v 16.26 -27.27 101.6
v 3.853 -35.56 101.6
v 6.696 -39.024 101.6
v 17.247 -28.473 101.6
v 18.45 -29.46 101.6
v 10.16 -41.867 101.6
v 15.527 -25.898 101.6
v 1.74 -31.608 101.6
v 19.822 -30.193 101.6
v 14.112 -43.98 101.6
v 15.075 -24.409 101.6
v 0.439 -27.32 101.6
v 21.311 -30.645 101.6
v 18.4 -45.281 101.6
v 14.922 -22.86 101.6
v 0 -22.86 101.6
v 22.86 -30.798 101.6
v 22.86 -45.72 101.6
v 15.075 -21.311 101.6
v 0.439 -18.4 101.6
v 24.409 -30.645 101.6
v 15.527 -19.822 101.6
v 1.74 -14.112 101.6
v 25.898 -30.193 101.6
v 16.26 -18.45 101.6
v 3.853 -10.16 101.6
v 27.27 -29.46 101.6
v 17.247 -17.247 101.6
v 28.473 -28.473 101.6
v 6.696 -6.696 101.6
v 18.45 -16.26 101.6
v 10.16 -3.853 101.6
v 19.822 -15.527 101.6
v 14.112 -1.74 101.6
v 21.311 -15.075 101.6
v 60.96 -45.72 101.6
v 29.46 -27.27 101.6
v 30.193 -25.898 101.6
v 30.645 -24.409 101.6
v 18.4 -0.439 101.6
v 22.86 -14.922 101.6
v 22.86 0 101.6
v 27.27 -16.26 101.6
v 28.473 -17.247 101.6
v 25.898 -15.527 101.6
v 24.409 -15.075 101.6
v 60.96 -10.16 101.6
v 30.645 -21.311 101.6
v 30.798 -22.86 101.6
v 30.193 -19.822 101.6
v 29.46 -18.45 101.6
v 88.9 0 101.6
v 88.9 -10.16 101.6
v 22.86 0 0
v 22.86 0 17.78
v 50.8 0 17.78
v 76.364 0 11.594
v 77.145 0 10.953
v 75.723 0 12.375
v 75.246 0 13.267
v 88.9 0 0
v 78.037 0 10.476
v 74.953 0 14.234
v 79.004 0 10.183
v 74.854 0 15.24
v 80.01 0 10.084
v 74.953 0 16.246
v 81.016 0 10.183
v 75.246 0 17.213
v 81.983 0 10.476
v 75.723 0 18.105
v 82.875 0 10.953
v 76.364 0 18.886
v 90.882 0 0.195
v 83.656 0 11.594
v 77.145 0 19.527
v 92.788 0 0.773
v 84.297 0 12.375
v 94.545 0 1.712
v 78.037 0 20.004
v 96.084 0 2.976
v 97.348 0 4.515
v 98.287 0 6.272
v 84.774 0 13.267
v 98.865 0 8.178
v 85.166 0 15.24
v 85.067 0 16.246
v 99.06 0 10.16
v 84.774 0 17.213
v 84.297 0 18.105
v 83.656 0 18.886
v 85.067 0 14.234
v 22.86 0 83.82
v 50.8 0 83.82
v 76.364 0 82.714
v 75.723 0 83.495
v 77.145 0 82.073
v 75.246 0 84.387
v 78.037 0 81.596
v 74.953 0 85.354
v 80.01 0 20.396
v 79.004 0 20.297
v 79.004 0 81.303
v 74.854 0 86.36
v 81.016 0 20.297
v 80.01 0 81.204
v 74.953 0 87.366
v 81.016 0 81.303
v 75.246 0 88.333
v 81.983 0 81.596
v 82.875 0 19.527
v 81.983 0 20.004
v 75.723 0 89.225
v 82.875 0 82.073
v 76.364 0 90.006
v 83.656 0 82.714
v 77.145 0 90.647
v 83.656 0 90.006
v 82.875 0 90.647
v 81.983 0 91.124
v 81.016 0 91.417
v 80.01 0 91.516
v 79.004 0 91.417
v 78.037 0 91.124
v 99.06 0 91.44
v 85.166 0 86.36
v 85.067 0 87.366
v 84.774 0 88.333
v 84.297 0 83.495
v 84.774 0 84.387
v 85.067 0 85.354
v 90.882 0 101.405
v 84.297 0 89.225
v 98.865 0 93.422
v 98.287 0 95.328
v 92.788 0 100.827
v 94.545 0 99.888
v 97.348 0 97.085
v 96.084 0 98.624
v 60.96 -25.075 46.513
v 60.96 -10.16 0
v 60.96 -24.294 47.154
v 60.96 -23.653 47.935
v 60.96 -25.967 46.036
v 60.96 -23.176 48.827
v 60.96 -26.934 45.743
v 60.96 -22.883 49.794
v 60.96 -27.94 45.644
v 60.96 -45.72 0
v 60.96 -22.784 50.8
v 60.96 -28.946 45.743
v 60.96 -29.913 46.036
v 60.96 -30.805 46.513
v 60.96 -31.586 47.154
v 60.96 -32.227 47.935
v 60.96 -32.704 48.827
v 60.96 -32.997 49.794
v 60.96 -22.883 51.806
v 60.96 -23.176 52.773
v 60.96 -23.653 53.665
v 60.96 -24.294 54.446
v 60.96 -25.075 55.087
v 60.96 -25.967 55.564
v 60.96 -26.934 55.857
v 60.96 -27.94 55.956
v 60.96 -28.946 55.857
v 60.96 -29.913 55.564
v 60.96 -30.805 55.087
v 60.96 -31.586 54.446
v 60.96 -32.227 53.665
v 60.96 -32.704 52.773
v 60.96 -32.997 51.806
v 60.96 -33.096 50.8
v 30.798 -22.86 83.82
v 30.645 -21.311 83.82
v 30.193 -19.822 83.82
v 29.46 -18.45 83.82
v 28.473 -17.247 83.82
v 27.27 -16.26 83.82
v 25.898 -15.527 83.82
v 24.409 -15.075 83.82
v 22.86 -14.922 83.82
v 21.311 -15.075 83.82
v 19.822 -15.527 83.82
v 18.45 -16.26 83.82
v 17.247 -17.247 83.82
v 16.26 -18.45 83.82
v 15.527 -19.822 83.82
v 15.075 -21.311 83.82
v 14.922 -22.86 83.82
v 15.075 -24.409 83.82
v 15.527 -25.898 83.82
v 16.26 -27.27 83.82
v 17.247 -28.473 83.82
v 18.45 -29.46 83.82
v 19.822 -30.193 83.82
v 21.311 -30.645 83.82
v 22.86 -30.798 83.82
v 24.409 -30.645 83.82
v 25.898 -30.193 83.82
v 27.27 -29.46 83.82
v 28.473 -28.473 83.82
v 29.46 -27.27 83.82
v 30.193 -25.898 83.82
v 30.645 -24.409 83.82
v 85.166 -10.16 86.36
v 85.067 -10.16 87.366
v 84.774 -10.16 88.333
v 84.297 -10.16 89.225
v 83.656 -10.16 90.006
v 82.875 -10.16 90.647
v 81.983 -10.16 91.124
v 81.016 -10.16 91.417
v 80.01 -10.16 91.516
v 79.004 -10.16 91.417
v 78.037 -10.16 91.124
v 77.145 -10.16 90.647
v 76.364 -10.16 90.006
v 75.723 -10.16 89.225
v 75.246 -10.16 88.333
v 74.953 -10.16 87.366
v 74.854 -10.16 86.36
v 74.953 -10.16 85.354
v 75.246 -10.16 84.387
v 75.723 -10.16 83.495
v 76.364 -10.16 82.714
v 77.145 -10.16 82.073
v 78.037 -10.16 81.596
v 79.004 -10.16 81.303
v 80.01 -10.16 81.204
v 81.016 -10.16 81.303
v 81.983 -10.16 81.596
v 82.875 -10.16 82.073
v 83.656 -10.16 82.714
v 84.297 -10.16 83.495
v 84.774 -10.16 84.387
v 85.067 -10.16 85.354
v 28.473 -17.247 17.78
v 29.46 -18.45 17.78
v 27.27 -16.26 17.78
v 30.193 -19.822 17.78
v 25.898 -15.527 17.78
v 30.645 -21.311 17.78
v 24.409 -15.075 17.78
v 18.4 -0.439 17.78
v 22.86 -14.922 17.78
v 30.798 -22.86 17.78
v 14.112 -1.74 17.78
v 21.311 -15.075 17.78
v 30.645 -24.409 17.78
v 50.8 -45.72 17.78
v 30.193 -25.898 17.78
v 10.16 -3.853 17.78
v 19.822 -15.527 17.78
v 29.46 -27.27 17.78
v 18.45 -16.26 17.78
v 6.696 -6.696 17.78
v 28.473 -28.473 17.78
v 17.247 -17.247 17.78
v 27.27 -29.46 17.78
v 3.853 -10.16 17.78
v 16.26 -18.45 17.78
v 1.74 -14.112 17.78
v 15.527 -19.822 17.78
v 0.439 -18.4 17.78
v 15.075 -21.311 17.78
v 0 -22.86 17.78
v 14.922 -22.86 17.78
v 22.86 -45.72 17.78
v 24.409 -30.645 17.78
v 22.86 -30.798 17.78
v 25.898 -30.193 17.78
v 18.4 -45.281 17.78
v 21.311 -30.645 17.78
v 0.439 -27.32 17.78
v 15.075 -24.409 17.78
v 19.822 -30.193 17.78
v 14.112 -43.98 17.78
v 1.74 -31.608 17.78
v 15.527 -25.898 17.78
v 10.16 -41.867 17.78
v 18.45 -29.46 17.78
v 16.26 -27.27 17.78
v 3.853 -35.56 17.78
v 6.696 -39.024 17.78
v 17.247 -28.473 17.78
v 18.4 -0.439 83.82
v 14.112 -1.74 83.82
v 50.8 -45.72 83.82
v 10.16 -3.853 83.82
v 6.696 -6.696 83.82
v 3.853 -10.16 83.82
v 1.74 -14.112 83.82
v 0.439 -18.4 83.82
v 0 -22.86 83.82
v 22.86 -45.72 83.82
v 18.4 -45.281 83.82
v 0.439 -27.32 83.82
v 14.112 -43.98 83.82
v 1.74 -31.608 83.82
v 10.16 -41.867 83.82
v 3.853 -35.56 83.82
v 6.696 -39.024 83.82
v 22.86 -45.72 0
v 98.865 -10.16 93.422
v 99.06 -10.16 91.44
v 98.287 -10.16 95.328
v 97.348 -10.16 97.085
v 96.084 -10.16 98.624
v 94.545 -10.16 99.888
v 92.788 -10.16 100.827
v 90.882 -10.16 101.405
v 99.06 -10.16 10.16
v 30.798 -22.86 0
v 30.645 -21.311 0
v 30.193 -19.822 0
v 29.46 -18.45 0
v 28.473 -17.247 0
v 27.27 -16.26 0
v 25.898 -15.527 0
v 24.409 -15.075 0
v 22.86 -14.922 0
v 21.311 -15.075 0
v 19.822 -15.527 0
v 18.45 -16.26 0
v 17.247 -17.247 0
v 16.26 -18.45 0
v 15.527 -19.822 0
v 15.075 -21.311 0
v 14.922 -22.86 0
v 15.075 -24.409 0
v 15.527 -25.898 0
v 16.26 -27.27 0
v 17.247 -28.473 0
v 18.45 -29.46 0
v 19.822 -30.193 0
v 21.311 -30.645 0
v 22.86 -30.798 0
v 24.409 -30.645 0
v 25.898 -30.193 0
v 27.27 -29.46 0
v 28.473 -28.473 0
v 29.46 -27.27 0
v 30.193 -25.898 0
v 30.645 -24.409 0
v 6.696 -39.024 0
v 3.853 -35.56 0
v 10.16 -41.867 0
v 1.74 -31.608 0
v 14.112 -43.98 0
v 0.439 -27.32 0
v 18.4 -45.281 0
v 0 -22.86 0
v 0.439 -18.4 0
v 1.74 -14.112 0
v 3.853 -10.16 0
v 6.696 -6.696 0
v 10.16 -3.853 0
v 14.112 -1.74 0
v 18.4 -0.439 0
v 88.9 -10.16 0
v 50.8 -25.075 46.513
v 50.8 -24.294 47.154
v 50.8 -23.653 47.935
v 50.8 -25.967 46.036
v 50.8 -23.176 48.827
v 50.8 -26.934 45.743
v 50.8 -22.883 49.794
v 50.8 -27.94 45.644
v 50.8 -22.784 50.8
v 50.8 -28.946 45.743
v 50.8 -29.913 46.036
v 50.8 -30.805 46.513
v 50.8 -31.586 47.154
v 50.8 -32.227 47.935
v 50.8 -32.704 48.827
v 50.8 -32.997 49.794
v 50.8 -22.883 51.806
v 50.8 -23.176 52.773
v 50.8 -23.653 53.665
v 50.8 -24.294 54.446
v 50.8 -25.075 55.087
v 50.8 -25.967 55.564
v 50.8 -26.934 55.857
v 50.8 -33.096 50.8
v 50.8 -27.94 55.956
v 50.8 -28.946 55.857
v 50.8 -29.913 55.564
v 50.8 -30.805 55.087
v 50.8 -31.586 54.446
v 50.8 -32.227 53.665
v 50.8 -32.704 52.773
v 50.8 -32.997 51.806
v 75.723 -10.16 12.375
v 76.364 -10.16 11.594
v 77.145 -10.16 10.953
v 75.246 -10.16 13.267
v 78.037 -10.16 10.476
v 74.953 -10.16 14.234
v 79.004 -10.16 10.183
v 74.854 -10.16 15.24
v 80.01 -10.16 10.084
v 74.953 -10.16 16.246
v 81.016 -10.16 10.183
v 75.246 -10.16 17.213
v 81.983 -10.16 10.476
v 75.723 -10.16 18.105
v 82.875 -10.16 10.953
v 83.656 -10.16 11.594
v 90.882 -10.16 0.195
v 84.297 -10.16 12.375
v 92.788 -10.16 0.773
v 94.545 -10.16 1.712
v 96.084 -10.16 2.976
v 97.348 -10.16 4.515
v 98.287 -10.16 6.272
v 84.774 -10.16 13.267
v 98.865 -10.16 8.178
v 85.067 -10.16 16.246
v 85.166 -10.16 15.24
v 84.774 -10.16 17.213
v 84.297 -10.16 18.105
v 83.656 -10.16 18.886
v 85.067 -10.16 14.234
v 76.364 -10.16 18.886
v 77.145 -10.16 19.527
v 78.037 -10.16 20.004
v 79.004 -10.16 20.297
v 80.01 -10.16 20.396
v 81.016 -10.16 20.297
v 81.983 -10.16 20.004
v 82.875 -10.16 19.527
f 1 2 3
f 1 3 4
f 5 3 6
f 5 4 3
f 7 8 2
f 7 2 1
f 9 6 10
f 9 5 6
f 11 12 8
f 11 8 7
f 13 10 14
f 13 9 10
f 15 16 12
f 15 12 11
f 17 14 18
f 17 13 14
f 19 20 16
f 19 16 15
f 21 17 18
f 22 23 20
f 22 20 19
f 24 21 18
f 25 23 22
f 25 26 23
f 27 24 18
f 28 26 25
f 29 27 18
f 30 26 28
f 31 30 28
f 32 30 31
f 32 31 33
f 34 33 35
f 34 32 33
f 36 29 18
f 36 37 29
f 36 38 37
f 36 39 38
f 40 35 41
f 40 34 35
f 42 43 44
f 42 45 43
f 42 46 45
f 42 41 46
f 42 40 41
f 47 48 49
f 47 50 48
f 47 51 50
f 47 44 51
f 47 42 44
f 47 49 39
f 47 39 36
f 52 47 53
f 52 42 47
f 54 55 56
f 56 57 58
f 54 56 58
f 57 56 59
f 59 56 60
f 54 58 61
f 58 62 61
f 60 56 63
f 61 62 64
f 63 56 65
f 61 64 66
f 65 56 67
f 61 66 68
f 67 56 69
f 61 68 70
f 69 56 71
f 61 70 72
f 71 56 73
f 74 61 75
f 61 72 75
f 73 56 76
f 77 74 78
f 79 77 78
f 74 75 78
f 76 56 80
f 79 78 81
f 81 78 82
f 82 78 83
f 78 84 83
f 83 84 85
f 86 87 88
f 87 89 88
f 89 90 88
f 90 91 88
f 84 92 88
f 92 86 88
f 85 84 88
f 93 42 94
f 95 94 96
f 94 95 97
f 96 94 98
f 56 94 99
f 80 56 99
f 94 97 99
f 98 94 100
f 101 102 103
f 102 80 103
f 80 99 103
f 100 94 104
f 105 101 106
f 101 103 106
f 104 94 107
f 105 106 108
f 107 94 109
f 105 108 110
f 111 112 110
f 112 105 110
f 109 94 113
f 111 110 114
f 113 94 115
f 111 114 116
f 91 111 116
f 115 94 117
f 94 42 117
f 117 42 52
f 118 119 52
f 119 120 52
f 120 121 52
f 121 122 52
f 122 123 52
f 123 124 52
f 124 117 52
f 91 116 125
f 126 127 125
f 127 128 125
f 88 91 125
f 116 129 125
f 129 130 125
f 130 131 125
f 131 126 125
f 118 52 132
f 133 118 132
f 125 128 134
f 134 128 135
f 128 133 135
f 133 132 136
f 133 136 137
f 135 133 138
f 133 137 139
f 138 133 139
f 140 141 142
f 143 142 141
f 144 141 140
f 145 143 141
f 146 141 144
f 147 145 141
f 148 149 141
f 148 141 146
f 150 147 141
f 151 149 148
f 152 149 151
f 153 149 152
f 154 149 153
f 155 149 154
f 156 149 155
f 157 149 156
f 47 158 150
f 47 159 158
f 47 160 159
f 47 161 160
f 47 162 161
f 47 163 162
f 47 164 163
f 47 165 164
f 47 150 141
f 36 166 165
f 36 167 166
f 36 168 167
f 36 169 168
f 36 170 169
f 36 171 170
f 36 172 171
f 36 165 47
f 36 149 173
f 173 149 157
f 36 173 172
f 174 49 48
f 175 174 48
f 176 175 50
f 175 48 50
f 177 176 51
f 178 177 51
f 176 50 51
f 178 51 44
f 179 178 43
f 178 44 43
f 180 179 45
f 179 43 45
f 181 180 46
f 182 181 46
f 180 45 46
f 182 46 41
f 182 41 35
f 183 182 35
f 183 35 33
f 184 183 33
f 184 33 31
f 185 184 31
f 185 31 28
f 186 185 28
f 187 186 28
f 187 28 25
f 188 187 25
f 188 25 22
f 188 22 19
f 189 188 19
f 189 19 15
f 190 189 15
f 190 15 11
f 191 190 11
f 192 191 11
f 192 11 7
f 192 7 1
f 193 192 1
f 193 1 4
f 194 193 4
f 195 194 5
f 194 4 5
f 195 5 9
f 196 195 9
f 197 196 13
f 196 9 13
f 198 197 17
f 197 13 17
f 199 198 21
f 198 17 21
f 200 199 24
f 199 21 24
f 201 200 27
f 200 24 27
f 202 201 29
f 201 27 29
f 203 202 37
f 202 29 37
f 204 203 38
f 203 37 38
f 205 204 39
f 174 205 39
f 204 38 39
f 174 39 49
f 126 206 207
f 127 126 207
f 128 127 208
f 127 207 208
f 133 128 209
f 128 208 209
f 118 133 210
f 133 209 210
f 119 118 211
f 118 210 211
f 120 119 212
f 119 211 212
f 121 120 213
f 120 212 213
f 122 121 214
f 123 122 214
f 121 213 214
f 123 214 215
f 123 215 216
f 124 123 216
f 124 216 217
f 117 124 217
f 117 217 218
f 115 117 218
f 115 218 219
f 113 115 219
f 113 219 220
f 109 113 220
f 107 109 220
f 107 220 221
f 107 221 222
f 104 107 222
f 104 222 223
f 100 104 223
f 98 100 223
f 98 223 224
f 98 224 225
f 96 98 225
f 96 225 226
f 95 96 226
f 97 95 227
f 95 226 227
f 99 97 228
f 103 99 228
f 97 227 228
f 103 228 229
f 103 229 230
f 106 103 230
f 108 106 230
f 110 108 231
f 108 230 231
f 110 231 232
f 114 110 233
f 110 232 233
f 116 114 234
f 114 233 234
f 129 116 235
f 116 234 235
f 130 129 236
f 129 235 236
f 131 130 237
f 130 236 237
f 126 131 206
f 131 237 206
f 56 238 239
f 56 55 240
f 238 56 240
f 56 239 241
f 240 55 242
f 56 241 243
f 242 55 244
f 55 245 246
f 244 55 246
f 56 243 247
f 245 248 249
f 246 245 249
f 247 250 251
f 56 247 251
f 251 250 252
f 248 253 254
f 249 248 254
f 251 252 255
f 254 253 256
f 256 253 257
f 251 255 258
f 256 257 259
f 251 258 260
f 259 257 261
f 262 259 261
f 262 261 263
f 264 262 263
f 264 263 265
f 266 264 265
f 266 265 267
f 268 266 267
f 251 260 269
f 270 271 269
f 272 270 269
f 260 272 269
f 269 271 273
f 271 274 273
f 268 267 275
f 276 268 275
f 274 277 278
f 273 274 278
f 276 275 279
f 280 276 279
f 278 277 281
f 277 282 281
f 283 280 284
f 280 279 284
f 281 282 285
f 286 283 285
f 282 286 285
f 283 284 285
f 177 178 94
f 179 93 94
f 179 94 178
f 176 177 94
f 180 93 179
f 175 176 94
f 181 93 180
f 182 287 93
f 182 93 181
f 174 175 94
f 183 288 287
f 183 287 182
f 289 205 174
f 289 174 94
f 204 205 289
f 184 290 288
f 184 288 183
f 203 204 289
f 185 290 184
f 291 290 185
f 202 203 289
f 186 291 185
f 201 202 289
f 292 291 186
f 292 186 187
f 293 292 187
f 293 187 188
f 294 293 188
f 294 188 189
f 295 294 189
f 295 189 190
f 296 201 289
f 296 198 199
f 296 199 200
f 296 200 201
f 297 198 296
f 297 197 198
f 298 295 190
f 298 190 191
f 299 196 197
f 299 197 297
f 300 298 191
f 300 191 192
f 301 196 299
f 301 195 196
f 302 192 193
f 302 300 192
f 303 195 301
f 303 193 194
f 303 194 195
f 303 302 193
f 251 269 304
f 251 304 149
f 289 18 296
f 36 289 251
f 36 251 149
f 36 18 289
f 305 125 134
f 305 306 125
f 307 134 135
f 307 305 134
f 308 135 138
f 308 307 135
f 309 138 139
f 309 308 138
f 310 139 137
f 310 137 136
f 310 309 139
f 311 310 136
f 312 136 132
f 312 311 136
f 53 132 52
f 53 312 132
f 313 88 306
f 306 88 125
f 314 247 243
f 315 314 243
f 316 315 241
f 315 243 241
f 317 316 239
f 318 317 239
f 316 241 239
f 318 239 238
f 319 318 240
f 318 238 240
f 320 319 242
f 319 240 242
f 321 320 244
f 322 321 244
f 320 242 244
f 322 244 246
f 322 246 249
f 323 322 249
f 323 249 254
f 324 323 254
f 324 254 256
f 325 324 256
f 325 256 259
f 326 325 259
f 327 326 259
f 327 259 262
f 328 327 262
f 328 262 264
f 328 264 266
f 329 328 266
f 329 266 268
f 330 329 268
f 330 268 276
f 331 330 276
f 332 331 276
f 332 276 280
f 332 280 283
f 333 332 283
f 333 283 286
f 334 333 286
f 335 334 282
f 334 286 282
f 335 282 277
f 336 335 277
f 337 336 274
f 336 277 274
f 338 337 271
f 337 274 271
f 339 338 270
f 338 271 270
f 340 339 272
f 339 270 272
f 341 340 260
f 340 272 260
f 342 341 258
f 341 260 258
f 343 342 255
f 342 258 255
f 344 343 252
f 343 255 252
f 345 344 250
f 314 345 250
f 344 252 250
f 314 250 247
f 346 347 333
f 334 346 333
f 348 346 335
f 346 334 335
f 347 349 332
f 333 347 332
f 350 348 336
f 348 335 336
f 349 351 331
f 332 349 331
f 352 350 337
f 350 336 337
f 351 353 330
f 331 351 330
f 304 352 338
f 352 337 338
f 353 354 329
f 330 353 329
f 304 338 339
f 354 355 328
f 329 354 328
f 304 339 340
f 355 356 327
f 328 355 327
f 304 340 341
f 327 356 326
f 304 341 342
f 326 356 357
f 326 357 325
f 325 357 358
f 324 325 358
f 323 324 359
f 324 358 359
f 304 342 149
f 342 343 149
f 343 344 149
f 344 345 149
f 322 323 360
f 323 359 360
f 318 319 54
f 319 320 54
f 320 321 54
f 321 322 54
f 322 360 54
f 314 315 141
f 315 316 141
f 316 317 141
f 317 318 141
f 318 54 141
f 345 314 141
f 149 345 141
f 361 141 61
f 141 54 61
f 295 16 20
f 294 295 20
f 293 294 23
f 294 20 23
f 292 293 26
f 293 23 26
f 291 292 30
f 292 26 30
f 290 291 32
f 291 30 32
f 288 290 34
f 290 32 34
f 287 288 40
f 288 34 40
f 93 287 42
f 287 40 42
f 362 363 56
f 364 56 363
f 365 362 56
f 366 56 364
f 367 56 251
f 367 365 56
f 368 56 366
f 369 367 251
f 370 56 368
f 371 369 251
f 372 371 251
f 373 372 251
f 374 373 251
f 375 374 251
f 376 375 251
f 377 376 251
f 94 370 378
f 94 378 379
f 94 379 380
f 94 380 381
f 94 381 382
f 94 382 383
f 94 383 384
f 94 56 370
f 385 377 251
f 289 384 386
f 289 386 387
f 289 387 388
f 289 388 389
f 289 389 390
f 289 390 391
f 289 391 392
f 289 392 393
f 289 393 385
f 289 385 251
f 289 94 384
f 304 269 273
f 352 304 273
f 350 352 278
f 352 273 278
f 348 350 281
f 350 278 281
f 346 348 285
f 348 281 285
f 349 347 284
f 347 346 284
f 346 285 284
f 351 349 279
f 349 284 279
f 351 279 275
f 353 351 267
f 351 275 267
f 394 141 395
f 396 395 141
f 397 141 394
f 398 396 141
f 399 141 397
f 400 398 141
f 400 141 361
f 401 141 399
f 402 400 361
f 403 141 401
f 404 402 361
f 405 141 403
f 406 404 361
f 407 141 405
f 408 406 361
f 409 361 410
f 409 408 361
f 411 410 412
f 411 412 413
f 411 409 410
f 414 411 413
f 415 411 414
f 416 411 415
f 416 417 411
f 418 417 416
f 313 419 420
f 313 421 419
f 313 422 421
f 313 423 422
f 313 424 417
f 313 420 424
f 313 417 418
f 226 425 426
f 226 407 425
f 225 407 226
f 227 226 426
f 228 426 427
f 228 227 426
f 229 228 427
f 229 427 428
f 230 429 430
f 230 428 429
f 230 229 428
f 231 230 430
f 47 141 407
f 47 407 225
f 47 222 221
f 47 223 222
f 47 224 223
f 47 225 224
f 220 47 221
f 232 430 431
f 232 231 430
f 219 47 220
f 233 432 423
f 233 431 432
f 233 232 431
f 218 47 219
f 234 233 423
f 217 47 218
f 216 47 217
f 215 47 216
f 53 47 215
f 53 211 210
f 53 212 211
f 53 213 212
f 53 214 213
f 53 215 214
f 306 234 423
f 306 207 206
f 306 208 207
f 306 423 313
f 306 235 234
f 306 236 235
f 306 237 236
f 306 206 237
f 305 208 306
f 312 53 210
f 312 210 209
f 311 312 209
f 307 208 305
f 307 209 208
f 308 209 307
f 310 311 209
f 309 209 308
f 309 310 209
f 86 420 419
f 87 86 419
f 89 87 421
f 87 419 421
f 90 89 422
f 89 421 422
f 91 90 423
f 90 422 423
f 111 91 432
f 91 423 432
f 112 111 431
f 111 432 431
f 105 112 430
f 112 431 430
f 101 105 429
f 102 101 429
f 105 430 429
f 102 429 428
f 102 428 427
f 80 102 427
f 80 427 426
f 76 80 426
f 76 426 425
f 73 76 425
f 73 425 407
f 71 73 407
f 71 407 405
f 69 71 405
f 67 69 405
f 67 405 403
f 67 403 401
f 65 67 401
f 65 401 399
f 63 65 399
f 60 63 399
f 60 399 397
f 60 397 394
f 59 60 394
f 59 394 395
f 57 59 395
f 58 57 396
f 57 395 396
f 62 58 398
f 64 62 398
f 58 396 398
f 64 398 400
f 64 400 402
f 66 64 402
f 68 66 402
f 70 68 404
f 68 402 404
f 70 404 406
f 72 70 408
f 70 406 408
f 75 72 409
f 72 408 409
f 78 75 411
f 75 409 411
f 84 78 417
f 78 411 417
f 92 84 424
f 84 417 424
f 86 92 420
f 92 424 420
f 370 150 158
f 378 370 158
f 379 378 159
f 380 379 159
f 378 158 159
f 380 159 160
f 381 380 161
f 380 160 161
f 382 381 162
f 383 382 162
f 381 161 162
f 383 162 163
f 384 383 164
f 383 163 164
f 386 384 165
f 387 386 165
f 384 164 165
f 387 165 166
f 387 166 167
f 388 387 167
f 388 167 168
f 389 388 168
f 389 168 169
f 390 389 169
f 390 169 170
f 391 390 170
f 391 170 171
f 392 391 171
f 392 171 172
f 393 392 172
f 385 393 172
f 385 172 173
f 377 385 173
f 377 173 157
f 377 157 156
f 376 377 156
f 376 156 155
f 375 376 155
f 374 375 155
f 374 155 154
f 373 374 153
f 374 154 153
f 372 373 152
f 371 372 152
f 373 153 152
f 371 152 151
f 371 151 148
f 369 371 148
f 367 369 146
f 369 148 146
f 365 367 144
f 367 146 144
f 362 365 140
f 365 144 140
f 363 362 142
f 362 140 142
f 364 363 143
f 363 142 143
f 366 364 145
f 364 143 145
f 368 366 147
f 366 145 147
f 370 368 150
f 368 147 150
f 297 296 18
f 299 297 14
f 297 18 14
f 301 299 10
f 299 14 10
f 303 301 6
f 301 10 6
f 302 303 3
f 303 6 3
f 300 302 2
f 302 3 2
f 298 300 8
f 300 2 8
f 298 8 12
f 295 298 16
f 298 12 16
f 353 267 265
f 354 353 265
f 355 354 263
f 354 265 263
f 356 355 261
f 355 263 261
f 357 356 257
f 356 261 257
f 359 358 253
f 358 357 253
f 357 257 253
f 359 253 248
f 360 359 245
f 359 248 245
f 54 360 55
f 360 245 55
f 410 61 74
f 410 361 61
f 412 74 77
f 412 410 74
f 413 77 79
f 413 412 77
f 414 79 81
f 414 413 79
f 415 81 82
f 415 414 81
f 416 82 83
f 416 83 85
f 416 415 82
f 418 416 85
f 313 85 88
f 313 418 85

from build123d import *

# Parameters (mm, degrees)
F0_W      = 99.06
F0_H      = 101.6
F1_DEPTH  = 45.72
F2_W      = 38.1
F2_H      = 101.6
F3_DEPTH  = 35.56
F4_W      = 45.72
F4_H      = 66.04
F5_DEPTH  = 50.8
F6_R      = 7.9375
F7_DEPTH  = 101.601
F8_R      = 5.1562
F9_DEPTH  = 60.961
F10_R     = 5.1562
F11_DEPTH = 10.161
F12_R     = 10.16


with BuildPart() as f1:
    # F0 (on Front) → F1 (new body)
    with BuildSketch(Plane.XZ):
        with Locations((49.53, 50.8)):
            Rectangle(F0_W, F0_H)
    extrude(amount=F1_DEPTH)

    # F2 (on face) → F3 (cut)
    with BuildSketch(Plane.XZ.offset(45.72)):
        with Locations((80.01, 50.8)):
            Rectangle(F2_W, F2_H)
    extrude(amount=-F3_DEPTH, mode=Mode.SUBTRACT)

    # F4 (on face) → F5 (cut)
    with BuildSketch(Plane(origin=(0, 0, 0), x_dir=(0, -1, 0), z_dir=(-1, 0, 0))):
        with Locations((22.86, 50.8)):
            Rectangle(F4_W, F4_H)
    extrude(amount=-F5_DEPTH, mode=Mode.SUBTRACT)

    # F6 (on face) → F7 (cut, through all)
    with BuildSketch(Plane.XY.offset(101.6)):
        with Locations((22.86, -22.86)):
            Circle(F6_R)
        with BuildLine():
            ThreePointArc((0, -22.86), (6.6955389909, -6.6955389733), (22.8600000249, 0))
            Line((22.8600000249, 0), (0, 0))
            Line((0, 0), (0, -22.86))
        make_face()
        with BuildLine():
            Line((0, -45.72), (22.86, -45.72))
            ThreePointArc((22.86, -45.72), (6.6955389821, -39.0244610179), (0, -22.86))
            Line((0, -22.86), (0, -45.72))
        make_face()
    extrude(amount=-F7_DEPTH, mode=Mode.SUBTRACT)

    # F8 (on face) → F9 (cut, through all)
    with BuildSketch(Plane.YZ.offset(60.96)):
        with Locations((-27.94, 50.8)):
            Circle(F8_R)
    extrude(amount=-F9_DEPTH, mode=Mode.SUBTRACT)

    # F10 (on face) → F11 (cut, through all)
    with BuildSketch(Plane.XZ.offset(10.16)):
        with Locations((80.01, 86.36)):
            Circle(F10_R)
        with Locations((80.01, 15.24)):
            Circle(F10_R)
    extrude(amount=-F11_DEPTH, mode=Mode.SUBTRACT)

    # F12
    f12_edges = [f1.edges().sort_by_distance(p)[0] for p in [
        (99.06, -5.08, 101.6),
        (99.06, -5.08, 0),
    ]]
    fillet(f12_edges, radius=F12_R)


solid = f1.part
